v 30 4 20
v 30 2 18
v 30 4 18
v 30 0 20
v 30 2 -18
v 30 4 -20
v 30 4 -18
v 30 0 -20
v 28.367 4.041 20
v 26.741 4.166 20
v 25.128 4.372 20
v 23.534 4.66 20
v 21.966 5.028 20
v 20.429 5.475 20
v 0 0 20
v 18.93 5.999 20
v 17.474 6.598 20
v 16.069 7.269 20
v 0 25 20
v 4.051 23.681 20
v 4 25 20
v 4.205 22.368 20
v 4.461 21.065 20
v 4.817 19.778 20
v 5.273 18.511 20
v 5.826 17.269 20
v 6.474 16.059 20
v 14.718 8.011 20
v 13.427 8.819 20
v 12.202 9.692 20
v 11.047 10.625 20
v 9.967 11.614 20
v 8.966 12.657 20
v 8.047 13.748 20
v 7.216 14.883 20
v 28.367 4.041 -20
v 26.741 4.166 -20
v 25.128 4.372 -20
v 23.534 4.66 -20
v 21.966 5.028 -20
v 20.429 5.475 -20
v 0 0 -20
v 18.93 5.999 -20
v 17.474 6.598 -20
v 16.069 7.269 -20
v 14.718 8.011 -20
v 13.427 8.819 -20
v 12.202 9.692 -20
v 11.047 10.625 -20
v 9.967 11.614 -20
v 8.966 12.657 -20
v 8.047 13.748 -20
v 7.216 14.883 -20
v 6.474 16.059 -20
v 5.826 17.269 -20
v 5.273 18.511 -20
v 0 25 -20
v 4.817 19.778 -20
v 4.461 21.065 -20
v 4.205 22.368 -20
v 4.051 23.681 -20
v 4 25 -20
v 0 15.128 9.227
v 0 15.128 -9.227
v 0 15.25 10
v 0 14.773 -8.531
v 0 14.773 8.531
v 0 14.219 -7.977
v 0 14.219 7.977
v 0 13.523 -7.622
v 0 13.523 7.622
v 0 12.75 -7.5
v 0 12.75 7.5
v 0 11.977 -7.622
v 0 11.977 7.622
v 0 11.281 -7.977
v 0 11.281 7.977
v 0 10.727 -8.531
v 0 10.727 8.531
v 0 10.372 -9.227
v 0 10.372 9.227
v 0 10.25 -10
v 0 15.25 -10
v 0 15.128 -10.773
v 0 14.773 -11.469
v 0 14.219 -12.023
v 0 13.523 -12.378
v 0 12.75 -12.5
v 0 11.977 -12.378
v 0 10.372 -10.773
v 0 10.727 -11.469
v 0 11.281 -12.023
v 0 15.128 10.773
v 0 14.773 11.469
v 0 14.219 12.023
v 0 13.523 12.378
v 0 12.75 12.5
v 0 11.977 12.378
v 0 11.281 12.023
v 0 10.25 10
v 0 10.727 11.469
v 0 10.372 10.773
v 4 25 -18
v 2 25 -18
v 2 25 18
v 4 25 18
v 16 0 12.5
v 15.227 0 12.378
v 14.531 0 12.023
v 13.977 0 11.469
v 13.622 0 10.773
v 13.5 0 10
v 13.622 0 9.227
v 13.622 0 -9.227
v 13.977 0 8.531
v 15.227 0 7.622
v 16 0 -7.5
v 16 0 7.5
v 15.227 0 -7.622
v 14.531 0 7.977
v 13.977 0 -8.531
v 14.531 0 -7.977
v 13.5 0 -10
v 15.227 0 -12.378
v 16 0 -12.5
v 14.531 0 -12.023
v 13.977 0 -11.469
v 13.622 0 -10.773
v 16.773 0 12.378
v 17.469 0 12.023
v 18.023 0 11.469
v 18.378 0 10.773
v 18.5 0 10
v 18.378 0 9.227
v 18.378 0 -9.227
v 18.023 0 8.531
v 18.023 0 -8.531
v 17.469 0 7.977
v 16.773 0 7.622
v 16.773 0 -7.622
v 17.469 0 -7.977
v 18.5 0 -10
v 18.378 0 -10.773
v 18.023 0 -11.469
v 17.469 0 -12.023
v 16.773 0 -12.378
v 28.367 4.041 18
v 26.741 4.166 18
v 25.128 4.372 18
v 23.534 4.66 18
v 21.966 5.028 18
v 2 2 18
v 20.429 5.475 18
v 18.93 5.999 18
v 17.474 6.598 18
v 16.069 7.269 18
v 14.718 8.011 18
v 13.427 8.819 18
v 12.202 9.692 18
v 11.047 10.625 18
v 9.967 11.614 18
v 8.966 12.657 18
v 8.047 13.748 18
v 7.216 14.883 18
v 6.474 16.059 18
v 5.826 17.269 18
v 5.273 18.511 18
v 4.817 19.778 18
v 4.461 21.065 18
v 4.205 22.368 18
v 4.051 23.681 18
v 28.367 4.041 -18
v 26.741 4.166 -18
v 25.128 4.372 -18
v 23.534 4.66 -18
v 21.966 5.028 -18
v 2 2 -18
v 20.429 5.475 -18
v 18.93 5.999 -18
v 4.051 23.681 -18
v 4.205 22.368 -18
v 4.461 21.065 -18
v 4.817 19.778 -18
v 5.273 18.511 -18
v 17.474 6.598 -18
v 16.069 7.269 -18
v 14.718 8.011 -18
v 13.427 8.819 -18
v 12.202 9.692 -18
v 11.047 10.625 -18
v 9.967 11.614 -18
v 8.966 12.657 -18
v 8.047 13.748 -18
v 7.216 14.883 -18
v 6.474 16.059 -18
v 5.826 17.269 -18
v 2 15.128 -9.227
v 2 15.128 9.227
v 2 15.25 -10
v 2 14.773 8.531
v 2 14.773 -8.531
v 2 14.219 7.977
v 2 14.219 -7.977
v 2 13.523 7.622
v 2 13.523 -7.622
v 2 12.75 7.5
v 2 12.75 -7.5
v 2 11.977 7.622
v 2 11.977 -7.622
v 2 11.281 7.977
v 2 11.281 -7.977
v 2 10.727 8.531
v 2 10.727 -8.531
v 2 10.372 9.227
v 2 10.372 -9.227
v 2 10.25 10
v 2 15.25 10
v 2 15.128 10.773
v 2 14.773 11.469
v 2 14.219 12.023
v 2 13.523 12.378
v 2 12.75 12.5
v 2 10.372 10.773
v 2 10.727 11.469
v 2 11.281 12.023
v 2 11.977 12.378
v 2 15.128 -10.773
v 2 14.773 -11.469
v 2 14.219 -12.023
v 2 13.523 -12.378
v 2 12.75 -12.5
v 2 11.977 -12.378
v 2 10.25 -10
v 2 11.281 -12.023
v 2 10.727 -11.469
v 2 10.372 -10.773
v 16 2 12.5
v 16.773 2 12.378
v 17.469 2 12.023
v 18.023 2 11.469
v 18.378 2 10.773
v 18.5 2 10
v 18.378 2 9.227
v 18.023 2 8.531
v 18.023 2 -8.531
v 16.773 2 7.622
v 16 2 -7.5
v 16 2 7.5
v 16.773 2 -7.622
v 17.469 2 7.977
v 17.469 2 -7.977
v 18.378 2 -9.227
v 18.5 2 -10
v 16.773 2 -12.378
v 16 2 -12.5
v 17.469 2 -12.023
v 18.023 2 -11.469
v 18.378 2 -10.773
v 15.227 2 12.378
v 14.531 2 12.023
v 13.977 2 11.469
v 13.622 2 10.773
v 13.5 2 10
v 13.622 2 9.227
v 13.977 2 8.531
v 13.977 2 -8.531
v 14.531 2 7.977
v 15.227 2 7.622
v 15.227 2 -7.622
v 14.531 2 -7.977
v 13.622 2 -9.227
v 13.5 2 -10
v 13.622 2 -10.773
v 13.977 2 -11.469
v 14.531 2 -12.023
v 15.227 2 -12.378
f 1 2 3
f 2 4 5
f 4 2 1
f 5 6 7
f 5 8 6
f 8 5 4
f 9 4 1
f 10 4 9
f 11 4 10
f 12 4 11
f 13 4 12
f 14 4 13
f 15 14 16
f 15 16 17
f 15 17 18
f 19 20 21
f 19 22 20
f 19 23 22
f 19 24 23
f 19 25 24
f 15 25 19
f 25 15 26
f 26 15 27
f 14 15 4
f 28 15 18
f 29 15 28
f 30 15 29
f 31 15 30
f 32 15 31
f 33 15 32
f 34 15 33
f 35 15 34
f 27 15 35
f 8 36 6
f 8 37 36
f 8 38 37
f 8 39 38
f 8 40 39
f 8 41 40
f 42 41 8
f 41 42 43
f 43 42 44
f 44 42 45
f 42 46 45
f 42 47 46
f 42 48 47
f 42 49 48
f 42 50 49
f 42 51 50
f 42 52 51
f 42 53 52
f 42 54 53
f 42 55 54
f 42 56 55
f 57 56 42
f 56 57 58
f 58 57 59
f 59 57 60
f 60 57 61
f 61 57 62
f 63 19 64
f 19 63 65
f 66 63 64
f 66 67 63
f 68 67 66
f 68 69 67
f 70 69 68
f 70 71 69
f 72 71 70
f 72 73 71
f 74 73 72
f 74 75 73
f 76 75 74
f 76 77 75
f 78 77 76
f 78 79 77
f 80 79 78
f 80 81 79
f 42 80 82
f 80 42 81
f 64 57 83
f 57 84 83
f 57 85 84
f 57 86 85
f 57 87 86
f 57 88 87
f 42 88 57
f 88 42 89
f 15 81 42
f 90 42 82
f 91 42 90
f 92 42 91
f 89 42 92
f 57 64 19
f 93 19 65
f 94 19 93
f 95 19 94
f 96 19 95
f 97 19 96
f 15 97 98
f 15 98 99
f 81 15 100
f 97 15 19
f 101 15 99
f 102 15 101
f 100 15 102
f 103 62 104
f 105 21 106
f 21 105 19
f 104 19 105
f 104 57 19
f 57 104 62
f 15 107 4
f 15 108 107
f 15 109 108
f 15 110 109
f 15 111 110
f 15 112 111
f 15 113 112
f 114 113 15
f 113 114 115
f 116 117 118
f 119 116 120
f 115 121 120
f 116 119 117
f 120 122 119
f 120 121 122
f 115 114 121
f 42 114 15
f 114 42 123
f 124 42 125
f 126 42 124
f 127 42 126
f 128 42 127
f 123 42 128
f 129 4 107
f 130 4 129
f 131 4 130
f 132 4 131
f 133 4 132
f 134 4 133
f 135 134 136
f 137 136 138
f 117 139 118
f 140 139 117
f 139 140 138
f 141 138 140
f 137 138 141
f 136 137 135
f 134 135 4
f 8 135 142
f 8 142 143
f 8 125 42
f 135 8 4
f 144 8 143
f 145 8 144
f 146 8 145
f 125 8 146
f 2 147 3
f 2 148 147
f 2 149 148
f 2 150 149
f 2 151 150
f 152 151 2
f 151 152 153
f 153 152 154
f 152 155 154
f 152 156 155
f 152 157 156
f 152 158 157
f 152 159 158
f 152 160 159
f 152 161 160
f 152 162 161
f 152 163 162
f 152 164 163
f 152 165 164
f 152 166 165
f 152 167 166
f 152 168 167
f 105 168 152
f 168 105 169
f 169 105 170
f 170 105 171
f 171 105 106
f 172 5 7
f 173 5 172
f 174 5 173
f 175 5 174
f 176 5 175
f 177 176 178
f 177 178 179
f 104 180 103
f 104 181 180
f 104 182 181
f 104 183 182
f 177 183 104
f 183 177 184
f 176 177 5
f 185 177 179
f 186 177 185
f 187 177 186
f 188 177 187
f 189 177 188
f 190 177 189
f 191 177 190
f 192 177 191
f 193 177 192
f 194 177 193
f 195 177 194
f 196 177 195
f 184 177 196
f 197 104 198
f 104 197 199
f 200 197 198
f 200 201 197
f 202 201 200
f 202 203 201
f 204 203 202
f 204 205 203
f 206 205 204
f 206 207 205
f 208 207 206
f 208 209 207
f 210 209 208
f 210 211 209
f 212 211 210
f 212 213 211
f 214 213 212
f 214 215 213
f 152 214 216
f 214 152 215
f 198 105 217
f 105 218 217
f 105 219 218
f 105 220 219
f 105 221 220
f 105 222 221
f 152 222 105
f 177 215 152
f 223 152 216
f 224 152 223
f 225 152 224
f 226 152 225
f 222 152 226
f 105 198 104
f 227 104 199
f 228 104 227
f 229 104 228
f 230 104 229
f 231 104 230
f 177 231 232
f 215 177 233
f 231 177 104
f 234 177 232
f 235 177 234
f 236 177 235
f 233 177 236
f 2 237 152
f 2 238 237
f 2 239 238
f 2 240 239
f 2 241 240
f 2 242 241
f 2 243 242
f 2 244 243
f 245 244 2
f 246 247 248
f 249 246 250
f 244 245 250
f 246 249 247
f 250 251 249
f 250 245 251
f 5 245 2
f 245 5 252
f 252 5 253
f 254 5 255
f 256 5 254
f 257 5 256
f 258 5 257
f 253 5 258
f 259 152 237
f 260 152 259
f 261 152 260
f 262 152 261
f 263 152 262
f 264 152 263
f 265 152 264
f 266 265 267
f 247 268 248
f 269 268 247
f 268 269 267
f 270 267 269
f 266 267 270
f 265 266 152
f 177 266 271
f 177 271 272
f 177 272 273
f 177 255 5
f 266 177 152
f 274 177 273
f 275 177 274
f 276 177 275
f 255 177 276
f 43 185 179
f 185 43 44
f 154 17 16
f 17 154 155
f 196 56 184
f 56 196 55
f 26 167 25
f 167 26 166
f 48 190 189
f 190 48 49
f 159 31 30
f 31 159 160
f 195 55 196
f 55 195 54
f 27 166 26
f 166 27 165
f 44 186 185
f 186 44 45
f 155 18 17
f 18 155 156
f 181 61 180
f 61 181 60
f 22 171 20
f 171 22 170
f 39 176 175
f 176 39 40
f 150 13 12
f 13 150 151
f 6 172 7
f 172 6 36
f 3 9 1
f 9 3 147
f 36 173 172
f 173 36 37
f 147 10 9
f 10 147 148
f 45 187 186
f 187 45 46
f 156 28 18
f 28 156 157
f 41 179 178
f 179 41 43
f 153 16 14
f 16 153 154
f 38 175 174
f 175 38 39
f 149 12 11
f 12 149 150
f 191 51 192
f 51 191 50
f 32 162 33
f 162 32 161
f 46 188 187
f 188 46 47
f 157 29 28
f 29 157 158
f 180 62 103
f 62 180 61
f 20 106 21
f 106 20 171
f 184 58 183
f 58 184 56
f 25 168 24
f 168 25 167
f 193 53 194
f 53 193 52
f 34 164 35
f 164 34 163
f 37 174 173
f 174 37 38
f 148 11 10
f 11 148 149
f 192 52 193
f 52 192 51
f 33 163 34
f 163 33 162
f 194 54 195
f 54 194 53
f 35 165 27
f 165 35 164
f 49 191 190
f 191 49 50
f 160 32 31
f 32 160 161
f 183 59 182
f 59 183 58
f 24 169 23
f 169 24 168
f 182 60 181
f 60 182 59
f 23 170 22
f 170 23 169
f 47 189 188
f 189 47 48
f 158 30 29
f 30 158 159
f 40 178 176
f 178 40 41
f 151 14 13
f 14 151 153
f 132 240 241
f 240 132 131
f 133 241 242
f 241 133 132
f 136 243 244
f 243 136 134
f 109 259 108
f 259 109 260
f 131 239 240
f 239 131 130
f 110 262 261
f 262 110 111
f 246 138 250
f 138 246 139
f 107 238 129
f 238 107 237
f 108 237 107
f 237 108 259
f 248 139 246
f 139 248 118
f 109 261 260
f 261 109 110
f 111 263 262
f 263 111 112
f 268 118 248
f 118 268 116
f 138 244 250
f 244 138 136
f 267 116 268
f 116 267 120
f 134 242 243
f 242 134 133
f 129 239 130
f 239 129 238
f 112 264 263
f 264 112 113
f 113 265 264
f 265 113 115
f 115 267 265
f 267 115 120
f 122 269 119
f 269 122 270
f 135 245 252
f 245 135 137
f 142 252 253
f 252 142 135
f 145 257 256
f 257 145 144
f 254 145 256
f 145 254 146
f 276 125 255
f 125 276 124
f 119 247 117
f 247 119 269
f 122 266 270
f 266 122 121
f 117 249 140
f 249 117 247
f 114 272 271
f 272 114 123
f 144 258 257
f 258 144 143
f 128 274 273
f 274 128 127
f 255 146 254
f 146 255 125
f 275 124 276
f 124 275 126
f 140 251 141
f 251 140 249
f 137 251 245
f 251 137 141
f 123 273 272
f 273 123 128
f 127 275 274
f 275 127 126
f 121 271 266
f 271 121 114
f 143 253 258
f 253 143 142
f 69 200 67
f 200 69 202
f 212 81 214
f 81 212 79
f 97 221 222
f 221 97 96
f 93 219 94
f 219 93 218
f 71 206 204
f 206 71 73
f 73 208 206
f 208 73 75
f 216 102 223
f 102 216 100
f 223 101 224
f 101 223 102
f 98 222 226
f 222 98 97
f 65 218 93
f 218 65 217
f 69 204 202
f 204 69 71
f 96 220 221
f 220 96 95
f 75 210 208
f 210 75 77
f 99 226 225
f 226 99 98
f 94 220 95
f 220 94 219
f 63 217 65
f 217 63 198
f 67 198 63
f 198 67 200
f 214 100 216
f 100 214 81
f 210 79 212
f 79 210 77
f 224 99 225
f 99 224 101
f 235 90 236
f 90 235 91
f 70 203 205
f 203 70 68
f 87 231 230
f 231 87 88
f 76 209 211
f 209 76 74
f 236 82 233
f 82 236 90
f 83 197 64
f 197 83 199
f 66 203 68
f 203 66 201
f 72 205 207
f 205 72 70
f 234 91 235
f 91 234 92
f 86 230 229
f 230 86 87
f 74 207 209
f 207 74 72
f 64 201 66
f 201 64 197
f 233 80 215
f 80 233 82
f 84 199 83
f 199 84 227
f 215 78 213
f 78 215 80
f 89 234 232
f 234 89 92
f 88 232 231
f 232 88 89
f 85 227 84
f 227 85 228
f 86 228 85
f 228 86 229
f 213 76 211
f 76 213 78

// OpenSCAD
///////////////////////////////////////////////////////////////////////////////////
// Parts for building a 3D Printer with aluminium extrusions an makerslide parts //
//                                                                               //
//  These are simple parts for using with FreeCAD (openscad module needed.       //
//  The parts are refined inside FreeCAD                                         //
//                                                                               //
//  (c) Holger Pasligh                                                           //
//  You can use this parts for your own purpose, as long you did not sell them   //
//                                                                               //
///////////////////////////////////////////////////////////////////////////////////


// X-Axis Mounting
// connects makerslide and universal plate small (myhobby-cnc.de)


//vars
l1 = 30;		//makerslide side
l2 = 25;		//universal plate side
h  = 40;		//heigth of part
wall = 2;	//wall thickness

sd = 5;		//diameter for screwholes
l_ms = 20;	//space between the mounting grooves makerslide
w_ms = (l1-wall)/2+wall; //mounting hole to edge makerslide side
l_up = 20;	//space between mounting holes universal plate small
w_up = 12.75;	//distance to mounting holes to edge universal plate


//construction
difference(){
translate([0,0,-h/2])cube([l1,l2,h]);
translate([wall,wall,-(h/2-wall)])cube([l1,l2,h-2*wall]);
translate([l1,l2,0])scale([l1-2*wall,l2-2*wall,1])cylinder(r=1, h=h+2, center = true, $fn=100);
translate([w_ms,0,l_ms/2])rotate([90,0,0])cylinder(r=sd/2, h=3*wall, center = true, $fn=20);
translate([w_ms,0,-l_ms/2])rotate([90,0,0])cylinder(r=sd/2, h=3*wall, center = true, $fn=20);
translate([0,w_up,l_up/2])rotate([0,90,0])cylinder(r=sd/2, h=3*wall, center = true, $fn=20);
translate([0,w_up,-l_up/2])rotate([0,90,0])cylinder(r=sd/2, h=3*wall, center = true, $fn=20);
}
